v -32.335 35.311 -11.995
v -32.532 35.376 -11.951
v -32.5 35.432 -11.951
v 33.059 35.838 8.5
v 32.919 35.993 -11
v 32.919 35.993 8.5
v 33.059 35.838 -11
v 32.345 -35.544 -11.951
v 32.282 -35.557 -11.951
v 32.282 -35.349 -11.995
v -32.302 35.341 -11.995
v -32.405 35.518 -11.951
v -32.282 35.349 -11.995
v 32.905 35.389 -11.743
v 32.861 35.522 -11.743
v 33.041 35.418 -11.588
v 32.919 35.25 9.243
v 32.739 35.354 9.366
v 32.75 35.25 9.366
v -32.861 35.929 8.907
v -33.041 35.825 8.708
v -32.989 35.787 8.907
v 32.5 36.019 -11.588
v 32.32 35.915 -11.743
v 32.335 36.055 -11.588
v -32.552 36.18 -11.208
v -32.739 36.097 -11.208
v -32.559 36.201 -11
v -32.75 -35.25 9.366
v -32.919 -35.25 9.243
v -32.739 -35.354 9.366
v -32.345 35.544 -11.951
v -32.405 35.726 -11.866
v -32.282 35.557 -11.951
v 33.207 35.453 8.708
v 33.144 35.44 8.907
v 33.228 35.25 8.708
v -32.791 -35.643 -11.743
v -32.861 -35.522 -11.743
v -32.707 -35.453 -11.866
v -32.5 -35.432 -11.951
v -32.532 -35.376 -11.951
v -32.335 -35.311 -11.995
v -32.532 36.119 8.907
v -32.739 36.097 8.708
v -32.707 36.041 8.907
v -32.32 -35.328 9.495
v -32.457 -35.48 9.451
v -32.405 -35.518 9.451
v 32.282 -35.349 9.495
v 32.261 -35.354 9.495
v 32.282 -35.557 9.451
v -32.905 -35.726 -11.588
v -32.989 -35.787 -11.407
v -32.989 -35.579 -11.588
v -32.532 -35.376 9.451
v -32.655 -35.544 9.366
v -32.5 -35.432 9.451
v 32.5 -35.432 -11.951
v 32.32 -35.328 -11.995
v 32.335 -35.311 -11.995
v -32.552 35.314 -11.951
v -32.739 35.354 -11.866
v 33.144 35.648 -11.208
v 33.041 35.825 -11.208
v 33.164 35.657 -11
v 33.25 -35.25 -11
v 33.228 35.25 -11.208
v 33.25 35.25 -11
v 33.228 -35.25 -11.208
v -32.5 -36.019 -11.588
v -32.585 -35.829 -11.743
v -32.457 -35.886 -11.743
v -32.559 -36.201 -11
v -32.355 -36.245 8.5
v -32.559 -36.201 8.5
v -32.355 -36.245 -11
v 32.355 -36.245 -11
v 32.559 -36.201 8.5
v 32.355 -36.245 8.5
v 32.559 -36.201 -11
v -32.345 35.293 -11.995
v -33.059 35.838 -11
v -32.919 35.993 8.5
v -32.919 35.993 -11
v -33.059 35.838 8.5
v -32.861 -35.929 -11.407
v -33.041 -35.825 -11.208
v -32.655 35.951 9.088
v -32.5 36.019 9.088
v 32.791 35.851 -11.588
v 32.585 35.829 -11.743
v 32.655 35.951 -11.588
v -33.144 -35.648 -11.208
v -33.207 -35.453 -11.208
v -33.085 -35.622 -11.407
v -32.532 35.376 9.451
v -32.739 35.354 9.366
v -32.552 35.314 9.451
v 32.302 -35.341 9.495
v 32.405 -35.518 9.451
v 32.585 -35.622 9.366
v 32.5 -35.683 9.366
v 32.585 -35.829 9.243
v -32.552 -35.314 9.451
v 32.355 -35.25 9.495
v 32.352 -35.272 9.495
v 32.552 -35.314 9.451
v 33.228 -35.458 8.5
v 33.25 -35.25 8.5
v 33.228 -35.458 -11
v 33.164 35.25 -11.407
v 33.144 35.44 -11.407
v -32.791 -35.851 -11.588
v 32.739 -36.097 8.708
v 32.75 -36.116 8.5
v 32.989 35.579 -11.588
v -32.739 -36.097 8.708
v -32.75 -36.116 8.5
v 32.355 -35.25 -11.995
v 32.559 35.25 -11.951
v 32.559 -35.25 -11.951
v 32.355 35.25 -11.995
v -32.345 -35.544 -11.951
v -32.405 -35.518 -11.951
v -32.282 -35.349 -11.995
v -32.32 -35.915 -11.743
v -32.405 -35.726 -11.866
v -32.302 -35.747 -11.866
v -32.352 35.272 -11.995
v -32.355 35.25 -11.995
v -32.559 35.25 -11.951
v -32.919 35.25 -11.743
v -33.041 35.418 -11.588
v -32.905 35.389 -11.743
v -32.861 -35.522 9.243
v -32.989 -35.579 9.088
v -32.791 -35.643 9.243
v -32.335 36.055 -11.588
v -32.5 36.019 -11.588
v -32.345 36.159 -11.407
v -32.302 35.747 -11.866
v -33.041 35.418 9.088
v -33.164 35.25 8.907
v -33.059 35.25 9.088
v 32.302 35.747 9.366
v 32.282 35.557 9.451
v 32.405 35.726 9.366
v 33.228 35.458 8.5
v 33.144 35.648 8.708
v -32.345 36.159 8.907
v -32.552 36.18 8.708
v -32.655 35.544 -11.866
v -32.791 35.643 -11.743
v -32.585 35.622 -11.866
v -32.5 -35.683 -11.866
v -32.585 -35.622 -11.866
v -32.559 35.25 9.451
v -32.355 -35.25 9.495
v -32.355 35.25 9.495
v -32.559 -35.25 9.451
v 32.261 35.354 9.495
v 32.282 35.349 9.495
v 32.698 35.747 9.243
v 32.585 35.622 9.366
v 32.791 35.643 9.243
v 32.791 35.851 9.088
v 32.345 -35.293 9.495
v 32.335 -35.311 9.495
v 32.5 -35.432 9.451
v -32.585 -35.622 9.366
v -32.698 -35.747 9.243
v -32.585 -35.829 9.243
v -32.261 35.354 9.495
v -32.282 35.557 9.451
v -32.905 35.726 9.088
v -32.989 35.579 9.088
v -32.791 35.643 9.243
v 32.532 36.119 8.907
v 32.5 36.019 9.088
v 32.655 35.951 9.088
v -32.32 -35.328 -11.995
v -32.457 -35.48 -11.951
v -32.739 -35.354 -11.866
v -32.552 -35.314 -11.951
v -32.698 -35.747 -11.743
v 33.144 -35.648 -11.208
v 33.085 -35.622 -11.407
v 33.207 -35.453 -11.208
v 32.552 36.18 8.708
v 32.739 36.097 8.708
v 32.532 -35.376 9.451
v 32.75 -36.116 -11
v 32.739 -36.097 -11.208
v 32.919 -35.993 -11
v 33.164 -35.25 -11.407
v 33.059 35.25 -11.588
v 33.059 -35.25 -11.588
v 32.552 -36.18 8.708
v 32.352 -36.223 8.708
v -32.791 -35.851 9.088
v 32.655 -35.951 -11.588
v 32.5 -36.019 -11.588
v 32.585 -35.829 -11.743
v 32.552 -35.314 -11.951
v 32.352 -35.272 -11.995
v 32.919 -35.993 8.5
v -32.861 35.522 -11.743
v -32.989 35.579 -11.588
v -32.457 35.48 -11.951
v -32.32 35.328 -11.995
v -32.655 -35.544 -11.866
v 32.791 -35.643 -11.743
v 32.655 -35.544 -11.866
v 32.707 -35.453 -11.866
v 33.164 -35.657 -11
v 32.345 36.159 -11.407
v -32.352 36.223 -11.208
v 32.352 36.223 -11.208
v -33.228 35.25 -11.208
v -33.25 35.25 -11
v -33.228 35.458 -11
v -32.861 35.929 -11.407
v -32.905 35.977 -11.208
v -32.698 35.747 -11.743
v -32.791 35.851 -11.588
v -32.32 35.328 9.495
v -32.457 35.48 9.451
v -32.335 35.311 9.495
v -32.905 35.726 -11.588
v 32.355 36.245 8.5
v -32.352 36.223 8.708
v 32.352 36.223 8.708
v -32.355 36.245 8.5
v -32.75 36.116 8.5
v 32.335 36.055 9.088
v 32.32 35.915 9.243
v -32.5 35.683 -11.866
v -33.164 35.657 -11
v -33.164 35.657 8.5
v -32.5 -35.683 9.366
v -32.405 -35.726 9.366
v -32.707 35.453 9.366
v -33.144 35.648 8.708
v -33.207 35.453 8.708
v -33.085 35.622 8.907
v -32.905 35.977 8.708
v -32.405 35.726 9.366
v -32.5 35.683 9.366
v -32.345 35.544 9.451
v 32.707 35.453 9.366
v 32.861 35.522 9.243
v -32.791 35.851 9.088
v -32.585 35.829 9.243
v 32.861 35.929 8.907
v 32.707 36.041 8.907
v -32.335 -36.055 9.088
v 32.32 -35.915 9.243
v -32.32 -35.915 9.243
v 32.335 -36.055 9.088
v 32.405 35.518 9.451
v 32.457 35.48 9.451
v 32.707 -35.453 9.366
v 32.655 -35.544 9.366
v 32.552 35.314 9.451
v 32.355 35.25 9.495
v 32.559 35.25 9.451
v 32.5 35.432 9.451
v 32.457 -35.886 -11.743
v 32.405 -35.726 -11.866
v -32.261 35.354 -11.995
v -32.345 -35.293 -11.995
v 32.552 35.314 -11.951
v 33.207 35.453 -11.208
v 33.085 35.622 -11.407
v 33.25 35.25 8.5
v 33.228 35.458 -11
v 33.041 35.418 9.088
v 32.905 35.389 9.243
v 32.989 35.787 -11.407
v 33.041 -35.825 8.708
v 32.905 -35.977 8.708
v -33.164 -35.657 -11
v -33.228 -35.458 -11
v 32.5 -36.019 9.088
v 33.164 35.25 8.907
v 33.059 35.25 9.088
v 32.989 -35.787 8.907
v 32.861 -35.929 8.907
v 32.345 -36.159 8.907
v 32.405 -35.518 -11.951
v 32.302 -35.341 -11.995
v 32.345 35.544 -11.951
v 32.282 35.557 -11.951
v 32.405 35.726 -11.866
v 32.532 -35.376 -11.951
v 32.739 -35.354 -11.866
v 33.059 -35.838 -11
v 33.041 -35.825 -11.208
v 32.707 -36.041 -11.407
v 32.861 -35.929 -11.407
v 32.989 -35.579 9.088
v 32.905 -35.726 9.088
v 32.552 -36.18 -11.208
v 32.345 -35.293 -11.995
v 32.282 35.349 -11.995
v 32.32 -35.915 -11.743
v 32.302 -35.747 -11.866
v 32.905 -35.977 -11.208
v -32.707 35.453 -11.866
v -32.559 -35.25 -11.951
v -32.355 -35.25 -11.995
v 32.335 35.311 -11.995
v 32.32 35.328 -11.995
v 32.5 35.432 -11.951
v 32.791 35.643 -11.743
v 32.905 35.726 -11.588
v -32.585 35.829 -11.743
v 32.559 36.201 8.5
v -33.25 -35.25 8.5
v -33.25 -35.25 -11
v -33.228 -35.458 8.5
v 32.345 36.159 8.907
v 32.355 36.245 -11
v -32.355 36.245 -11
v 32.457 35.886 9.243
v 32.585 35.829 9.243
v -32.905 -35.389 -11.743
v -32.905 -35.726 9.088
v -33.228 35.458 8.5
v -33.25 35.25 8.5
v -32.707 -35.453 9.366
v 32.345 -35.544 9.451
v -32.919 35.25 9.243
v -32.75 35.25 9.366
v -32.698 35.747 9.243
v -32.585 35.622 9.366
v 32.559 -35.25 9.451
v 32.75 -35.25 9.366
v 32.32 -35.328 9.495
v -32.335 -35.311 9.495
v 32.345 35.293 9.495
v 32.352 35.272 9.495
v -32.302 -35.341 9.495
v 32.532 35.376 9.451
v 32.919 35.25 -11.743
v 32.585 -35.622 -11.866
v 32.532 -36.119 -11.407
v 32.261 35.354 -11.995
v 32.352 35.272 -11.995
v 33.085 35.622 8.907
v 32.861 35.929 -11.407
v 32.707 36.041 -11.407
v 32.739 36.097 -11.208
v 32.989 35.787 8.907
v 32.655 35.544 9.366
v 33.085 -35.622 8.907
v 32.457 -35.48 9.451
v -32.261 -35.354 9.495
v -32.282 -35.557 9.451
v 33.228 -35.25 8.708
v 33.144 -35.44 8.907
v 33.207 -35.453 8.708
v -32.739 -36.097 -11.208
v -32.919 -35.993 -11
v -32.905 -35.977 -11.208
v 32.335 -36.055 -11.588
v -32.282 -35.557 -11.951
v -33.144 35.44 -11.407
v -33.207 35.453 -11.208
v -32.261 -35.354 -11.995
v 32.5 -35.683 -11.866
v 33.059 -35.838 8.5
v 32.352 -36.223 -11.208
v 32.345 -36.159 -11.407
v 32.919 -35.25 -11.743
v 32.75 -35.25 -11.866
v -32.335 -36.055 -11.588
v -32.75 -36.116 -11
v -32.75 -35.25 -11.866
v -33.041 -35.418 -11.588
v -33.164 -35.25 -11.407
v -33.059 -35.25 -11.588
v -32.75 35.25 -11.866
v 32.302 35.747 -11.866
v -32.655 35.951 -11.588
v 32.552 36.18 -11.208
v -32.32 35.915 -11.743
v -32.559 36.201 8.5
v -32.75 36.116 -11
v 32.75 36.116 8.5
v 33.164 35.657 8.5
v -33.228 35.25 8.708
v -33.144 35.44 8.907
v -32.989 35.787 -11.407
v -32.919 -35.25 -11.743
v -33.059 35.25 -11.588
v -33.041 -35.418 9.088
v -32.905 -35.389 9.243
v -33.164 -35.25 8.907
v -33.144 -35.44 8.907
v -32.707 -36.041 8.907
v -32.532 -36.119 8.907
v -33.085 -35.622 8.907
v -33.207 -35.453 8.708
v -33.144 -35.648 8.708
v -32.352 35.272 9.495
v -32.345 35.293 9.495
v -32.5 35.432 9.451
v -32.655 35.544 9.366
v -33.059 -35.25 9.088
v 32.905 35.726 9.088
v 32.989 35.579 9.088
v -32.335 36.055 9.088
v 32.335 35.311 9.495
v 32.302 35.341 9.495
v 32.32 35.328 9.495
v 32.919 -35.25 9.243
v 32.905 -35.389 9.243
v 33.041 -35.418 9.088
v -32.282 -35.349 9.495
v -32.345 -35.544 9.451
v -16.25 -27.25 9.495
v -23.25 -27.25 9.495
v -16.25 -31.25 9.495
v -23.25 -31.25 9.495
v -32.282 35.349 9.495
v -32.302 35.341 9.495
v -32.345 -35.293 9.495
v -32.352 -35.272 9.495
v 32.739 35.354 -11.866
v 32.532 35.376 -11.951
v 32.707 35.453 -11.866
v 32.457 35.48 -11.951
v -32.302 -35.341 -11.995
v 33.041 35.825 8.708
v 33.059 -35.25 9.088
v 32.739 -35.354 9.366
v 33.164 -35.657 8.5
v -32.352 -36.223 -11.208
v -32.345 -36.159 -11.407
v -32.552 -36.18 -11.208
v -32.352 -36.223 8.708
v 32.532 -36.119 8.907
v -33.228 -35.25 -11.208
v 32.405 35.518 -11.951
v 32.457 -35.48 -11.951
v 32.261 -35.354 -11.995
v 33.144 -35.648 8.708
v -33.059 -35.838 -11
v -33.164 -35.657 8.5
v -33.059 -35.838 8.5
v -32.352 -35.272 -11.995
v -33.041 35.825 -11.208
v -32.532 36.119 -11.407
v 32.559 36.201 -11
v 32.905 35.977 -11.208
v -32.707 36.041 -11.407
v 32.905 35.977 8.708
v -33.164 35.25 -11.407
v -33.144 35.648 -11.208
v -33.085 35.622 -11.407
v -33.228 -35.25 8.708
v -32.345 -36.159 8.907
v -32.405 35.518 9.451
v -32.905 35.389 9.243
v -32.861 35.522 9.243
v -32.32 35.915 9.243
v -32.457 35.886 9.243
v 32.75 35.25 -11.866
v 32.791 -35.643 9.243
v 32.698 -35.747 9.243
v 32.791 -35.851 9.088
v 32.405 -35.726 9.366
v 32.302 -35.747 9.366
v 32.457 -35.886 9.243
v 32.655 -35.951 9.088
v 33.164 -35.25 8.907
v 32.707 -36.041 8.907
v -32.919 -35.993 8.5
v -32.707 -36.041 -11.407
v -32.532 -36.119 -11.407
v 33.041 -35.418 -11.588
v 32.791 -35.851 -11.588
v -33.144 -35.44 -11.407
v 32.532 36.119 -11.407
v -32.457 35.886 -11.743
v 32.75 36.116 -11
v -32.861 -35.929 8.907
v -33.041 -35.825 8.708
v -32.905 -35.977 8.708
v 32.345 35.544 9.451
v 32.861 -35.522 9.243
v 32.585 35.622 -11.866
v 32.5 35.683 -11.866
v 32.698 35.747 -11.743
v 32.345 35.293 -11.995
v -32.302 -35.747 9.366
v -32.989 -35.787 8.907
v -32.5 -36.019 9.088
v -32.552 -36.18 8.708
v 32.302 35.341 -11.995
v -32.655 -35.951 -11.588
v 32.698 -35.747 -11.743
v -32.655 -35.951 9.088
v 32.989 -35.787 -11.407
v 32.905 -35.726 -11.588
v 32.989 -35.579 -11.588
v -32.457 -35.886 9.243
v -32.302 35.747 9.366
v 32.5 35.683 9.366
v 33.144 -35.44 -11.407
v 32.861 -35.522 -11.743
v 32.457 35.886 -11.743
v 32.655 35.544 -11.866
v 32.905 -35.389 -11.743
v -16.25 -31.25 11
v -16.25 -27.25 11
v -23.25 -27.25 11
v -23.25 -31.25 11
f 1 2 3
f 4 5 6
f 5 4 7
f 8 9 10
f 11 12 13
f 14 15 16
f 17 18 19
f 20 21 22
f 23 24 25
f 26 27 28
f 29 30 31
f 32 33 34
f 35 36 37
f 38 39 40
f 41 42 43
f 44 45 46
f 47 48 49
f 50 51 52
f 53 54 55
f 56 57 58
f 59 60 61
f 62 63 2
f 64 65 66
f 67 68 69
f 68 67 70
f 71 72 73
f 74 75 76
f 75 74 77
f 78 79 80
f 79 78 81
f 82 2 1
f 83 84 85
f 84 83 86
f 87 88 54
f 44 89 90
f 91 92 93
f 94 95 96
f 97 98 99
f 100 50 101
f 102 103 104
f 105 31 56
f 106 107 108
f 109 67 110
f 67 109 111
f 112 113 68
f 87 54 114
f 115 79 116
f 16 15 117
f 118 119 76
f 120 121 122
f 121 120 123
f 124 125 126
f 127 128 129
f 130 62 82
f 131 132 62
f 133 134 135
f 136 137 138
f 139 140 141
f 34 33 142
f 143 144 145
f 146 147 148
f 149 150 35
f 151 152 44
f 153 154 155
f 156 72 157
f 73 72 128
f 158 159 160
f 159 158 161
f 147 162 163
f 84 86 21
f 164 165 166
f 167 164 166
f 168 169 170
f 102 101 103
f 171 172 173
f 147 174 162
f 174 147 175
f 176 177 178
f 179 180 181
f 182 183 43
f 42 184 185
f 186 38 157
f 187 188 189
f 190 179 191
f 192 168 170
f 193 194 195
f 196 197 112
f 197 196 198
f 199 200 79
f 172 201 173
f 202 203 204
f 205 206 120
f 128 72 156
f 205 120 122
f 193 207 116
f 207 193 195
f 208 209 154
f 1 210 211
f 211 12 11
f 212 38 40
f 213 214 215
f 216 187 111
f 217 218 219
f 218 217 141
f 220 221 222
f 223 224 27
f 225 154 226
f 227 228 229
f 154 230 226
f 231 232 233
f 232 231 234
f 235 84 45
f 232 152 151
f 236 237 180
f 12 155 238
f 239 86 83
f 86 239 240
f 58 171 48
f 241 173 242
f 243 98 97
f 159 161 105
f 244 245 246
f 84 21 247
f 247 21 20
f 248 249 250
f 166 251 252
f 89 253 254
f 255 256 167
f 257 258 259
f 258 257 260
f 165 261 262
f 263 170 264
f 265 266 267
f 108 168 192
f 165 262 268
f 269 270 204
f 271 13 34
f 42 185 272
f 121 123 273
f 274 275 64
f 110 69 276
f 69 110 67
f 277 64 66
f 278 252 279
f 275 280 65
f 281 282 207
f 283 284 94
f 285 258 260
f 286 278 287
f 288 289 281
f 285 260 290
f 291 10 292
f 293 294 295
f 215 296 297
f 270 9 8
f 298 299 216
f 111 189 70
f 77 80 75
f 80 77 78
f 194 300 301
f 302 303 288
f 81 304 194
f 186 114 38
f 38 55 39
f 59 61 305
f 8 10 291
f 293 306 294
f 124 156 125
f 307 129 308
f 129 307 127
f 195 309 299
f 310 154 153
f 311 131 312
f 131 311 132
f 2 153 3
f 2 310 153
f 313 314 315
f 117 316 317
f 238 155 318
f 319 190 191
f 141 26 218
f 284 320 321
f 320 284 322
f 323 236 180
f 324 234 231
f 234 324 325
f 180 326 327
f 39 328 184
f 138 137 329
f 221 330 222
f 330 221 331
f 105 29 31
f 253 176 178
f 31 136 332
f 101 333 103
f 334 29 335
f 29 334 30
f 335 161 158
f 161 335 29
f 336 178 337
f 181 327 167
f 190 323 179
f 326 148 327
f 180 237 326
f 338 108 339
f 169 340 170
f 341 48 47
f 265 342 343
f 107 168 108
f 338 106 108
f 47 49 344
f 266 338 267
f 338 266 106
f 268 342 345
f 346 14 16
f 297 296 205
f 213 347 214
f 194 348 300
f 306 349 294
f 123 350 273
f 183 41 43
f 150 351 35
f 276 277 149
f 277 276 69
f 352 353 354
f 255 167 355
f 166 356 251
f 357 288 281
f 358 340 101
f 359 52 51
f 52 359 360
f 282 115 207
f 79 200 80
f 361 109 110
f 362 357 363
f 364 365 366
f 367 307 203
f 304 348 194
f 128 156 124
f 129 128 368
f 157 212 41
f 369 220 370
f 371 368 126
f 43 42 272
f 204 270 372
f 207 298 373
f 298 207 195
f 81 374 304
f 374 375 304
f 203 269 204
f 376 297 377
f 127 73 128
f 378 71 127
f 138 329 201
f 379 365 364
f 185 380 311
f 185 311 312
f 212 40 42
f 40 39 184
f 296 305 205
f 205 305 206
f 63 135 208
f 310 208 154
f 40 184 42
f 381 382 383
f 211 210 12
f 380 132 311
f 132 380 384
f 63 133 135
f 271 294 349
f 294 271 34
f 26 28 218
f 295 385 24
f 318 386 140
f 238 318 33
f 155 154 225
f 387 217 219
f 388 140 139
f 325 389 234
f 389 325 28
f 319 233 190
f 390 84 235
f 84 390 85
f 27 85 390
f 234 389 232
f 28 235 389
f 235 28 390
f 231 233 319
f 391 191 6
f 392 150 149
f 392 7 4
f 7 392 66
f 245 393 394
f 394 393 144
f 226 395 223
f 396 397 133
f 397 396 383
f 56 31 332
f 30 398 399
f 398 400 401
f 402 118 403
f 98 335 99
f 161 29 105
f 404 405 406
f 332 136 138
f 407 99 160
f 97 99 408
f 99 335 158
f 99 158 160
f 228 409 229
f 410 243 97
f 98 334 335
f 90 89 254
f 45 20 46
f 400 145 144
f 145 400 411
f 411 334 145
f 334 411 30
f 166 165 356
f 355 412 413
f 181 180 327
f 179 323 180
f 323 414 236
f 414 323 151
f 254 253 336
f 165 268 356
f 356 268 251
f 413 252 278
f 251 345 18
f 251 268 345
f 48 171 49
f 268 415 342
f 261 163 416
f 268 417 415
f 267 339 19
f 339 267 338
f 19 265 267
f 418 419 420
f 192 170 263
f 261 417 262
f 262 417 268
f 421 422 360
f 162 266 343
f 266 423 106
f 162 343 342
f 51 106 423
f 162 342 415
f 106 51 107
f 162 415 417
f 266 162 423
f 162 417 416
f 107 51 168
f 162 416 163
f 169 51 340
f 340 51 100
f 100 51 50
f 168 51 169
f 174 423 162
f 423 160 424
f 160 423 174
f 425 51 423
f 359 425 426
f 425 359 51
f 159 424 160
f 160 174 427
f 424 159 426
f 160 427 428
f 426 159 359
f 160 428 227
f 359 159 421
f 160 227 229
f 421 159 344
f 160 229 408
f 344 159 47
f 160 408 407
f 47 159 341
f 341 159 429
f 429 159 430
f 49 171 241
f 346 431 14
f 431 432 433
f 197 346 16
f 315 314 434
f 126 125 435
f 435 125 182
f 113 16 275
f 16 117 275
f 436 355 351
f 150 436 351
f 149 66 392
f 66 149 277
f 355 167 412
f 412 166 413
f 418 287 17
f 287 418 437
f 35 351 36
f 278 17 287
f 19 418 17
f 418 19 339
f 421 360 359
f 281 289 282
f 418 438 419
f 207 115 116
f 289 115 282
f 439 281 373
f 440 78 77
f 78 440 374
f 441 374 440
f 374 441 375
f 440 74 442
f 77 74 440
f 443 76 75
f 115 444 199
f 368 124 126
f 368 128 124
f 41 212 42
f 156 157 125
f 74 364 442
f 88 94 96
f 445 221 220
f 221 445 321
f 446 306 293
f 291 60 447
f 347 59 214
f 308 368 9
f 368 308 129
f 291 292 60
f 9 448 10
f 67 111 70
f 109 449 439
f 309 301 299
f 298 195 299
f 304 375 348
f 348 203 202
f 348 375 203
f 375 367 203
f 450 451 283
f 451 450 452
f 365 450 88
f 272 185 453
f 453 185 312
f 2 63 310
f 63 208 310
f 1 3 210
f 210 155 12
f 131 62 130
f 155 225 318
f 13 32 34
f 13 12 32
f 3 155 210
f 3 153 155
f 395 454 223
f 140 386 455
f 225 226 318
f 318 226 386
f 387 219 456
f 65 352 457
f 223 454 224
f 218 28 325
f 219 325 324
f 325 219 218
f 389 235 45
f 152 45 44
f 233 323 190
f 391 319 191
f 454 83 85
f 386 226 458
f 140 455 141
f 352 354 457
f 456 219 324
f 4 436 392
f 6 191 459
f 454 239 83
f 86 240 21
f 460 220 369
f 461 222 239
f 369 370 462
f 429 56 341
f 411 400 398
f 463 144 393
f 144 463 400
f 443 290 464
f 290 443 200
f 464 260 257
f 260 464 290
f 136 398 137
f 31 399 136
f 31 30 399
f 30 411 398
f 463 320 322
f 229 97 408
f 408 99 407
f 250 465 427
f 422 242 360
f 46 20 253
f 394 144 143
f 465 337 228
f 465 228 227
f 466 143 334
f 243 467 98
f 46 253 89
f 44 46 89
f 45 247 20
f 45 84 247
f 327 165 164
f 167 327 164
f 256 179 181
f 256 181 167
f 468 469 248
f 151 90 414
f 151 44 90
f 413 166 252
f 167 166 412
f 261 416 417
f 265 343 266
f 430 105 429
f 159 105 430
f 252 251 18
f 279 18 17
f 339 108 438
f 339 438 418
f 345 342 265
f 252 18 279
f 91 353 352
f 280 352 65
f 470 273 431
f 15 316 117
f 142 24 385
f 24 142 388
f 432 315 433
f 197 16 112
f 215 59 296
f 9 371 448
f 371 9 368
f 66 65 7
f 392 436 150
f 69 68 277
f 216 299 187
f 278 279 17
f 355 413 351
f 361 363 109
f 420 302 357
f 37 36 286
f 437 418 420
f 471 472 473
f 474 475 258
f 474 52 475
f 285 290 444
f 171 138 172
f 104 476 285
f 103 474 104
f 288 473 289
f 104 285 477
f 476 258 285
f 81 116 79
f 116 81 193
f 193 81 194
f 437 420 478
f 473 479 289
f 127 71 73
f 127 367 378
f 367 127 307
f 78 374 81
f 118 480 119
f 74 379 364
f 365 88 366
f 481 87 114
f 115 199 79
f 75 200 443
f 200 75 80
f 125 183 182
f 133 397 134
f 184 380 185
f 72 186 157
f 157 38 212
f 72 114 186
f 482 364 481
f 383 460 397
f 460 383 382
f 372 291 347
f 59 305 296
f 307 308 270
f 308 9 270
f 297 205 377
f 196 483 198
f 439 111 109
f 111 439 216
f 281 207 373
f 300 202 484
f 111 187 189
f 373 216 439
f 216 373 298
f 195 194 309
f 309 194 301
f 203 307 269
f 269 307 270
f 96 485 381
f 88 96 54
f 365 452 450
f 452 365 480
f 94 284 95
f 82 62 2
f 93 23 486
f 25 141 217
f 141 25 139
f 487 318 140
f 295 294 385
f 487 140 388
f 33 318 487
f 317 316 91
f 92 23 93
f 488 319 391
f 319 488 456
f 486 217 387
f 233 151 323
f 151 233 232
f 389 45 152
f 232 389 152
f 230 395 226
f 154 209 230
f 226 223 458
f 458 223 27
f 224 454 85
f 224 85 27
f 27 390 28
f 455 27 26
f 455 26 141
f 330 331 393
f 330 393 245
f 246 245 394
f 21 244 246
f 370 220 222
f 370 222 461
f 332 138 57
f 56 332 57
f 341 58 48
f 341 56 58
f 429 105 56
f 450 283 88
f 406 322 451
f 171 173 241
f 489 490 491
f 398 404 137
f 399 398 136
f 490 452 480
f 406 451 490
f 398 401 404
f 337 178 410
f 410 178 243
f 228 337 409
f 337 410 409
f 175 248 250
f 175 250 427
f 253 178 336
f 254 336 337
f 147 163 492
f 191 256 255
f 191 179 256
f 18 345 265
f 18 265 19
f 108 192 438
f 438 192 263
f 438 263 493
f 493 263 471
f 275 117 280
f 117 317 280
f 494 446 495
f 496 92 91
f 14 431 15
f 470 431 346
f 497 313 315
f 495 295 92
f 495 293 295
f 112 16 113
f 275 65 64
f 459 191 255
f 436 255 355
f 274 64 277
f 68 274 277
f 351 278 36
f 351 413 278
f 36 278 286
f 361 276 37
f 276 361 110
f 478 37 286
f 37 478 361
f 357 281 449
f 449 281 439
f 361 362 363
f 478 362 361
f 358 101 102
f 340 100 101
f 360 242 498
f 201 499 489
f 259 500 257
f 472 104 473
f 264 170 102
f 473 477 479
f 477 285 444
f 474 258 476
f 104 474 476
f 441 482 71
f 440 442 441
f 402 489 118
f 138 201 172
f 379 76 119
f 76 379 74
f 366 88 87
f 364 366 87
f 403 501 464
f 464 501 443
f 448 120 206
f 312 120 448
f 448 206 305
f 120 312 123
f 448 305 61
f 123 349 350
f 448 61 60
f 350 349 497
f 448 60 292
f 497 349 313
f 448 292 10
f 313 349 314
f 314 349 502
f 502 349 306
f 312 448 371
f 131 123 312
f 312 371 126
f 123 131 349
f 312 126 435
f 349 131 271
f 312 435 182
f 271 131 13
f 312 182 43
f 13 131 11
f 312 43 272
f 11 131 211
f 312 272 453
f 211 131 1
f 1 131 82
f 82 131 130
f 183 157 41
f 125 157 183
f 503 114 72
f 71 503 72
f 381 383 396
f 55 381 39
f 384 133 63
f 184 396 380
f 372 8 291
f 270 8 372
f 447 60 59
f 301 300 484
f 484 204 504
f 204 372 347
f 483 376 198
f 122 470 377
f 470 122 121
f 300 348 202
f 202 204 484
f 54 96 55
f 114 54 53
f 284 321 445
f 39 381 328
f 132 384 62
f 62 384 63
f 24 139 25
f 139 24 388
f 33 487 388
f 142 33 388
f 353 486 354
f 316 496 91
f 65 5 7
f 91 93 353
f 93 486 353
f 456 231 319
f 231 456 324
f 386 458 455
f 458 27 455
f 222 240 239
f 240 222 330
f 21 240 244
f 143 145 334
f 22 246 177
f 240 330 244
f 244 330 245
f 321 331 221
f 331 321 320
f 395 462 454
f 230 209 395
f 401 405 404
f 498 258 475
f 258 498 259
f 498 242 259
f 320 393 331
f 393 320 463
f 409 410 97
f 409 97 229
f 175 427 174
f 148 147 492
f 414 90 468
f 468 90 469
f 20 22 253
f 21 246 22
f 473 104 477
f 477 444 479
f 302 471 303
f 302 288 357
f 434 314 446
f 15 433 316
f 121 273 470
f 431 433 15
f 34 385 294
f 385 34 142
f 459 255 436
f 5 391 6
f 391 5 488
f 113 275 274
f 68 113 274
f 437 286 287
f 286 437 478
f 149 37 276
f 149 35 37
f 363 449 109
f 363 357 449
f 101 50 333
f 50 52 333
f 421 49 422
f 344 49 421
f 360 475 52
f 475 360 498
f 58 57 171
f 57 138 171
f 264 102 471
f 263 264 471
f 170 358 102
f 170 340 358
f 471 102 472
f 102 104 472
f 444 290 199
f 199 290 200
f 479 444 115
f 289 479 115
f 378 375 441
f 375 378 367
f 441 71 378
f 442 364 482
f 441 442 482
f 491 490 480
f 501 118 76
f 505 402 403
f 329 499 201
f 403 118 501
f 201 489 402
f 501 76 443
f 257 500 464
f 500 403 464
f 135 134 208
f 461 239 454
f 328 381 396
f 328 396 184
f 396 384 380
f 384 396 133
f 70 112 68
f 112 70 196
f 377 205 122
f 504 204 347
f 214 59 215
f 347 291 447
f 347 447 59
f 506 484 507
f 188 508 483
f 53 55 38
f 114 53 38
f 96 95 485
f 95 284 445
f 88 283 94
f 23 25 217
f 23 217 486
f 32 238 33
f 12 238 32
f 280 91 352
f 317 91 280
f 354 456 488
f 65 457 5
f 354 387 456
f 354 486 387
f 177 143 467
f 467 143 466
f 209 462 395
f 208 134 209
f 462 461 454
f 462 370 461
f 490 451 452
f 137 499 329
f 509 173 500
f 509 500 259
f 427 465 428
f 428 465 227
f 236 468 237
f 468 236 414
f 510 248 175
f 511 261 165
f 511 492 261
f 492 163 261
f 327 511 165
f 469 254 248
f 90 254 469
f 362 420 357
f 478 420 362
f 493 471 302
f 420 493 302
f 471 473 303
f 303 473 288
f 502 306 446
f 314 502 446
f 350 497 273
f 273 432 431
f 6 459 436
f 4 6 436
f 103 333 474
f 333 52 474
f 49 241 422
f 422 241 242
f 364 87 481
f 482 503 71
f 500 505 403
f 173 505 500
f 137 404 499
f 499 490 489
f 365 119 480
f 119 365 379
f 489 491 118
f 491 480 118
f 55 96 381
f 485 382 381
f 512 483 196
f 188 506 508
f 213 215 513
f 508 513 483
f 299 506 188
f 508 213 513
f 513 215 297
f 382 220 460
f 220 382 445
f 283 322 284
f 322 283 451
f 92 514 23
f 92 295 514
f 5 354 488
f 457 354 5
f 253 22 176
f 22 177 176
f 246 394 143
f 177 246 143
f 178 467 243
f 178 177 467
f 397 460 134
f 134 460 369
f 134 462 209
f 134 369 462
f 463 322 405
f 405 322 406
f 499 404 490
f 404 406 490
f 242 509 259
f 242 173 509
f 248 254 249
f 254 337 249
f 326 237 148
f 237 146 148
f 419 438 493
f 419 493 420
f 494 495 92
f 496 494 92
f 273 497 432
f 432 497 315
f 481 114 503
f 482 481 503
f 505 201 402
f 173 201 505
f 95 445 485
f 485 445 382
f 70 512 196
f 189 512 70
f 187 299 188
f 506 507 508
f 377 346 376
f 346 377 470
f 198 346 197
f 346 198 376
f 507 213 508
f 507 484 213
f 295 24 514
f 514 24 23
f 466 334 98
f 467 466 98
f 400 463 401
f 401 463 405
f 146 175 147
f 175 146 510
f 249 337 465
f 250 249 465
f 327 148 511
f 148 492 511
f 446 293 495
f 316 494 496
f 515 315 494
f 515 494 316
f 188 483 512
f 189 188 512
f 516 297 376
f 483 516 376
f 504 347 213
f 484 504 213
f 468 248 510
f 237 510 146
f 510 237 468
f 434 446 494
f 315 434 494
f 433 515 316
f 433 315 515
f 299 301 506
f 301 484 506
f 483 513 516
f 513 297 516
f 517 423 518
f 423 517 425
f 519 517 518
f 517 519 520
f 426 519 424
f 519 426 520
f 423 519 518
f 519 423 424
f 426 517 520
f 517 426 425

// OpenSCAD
// file: rounded-beam.scad
// -*-C-*-
// Model for rounded beam.
//
// Copyright 2013, Brian Davis
//
// License: LGPL 2.1 or later

// A beam (AKA rectangle/cube) with rounded edges.
// width is the distance along the x-axis
// length is the distance along the y-axis
// height is the distance along the z-axis
module roundedbeam(width=10, length=10, height=100) {
  hull() {
    // base
    sphere(r=1);
    translate([width, 0, 0]) sphere(r=1);
    translate([0, length, 0]) sphere(r=1);
    translate([width, length, 0]) sphere(r=1);
    // top
    translate([0, 0, height]) sphere(r=1);
    translate([width, 0, height]) sphere(r=1);
    translate([0, length, height]) sphere(r=1);
    translate([width, length, height]) sphere(r=1);
  }
};

// A rounded beam centered on [0, 0, 0].
// width is the distance along the x-axis.
// length is the distance along the y-axis.
// height is the distance along the z-axis.
module c_roundedbeam(width, length, height) {
  translate([-width / 2, -length / 2, -height / 2])
    roundedbeam(width=width, length=length, height=height);
}
// main file
// -*-C-*-
// Models for various battery packs.
//
// Copyright 2013, Brian Davis
//
// License: LGPL 2.1 or later

use <rounded-beam.scad>

// Battery pack holding 4 AA batteries and having a
// small on/off switch in one corner.
//
// Note: details of connection wires are not included.
// Totals:
// width (x-axis): 64.5mm
// length (y-axis): 70.5mm
// height (z-axis): 22mm
module battery_pack_4_AA() {
  // Center the model.
  translate([-32.25, -35.25, -11])
  color("black")
  union() {
    // Main body.
    roundedbeam(width=64.5, length=70.5, height=19.5);
    // On/off switch.
    translate([9, 4, 20])
      cube([7, 4, 2]);
  };
}

// Test renders
$fn=30;

battery_pack_4_AA();
